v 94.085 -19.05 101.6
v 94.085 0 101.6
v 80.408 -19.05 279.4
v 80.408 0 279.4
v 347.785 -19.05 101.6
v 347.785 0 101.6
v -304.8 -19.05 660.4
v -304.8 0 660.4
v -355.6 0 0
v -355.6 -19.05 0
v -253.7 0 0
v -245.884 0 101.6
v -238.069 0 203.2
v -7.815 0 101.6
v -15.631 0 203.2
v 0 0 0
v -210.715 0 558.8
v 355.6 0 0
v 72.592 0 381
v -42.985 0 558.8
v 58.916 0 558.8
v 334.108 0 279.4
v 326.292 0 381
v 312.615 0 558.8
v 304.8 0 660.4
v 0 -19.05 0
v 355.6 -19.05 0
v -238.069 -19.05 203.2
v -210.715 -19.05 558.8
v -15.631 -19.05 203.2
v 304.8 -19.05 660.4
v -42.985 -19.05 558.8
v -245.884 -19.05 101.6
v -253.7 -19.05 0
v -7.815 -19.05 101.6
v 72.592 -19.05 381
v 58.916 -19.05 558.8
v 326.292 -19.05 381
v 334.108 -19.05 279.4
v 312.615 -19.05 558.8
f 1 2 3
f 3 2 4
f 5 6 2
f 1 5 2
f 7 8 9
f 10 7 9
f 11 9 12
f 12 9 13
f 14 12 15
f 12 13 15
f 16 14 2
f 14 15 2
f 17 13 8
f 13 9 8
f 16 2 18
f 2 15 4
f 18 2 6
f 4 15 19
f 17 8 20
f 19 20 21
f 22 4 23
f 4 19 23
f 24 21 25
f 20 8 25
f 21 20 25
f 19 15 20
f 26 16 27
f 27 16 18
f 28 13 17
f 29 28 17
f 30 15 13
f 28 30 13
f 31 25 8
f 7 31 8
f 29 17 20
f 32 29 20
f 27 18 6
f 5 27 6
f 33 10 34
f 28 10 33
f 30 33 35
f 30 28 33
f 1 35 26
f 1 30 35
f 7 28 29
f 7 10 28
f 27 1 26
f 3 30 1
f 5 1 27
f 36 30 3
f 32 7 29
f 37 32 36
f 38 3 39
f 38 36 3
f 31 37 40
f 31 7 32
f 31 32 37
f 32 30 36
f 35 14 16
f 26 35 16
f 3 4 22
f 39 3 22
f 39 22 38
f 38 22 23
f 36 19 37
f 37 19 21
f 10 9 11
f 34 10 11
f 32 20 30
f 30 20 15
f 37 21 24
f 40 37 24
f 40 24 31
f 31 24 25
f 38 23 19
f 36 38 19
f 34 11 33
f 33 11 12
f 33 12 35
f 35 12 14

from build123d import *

# Parameters (mm, degrees)
F1_DEPTH = 19.05


with BuildPart() as f1:
    # F0 (on Front) → F1 (new body)
    with BuildSketch(Plane.XZ):
        Polygon((304.8, 660.4), (51.1001483644, 660.4), (58.9155329798, 558.8), (312.6153846154, 558.8), align=None)
        Polygon((94.084763749, 101.6), (101.9001483644, 0), (355.6, 0), (347.7846153846, 101.6), align=None)
        Polygon((-238.0690824048, 203.2), (-245.8844670202, 101.6), (-7.8153846154, 101.6), (-15.6307692308, 203.2), align=None)
        Polygon((326.2923076923, 381), (72.5924560567, 381), (80.4078406721, 279.4), (334.1076923077, 279.4), align=None)
        Polygon((-202.8998516356, 660.4), (-304.8, 660.4), (-355.6, 0), (-253.6998516356, 0), (-245.8844670202, 101.6), (-238.0690824048, 203.2), (-210.715236251, 558.8), align=None)
        Polygon((51.1001483644, 660.4), (-50.8, 660.4), (-42.9846153846, 558.8), (-15.6307692308, 203.2), (-7.8153846154, 101.6), (0, 0), (101.9001483644, 0), (94.084763749, 101.6), (80.4078406721, 279.4), (72.5924560567, 381), (58.9155329798, 558.8), align=None)
        Polygon((-50.8, 660.4), (-202.8998516356, 660.4), (-210.715236251, 558.8), (-42.9846153846, 558.8), align=None)
    extrude(amount=F1_DEPTH)


solid = f1.part
